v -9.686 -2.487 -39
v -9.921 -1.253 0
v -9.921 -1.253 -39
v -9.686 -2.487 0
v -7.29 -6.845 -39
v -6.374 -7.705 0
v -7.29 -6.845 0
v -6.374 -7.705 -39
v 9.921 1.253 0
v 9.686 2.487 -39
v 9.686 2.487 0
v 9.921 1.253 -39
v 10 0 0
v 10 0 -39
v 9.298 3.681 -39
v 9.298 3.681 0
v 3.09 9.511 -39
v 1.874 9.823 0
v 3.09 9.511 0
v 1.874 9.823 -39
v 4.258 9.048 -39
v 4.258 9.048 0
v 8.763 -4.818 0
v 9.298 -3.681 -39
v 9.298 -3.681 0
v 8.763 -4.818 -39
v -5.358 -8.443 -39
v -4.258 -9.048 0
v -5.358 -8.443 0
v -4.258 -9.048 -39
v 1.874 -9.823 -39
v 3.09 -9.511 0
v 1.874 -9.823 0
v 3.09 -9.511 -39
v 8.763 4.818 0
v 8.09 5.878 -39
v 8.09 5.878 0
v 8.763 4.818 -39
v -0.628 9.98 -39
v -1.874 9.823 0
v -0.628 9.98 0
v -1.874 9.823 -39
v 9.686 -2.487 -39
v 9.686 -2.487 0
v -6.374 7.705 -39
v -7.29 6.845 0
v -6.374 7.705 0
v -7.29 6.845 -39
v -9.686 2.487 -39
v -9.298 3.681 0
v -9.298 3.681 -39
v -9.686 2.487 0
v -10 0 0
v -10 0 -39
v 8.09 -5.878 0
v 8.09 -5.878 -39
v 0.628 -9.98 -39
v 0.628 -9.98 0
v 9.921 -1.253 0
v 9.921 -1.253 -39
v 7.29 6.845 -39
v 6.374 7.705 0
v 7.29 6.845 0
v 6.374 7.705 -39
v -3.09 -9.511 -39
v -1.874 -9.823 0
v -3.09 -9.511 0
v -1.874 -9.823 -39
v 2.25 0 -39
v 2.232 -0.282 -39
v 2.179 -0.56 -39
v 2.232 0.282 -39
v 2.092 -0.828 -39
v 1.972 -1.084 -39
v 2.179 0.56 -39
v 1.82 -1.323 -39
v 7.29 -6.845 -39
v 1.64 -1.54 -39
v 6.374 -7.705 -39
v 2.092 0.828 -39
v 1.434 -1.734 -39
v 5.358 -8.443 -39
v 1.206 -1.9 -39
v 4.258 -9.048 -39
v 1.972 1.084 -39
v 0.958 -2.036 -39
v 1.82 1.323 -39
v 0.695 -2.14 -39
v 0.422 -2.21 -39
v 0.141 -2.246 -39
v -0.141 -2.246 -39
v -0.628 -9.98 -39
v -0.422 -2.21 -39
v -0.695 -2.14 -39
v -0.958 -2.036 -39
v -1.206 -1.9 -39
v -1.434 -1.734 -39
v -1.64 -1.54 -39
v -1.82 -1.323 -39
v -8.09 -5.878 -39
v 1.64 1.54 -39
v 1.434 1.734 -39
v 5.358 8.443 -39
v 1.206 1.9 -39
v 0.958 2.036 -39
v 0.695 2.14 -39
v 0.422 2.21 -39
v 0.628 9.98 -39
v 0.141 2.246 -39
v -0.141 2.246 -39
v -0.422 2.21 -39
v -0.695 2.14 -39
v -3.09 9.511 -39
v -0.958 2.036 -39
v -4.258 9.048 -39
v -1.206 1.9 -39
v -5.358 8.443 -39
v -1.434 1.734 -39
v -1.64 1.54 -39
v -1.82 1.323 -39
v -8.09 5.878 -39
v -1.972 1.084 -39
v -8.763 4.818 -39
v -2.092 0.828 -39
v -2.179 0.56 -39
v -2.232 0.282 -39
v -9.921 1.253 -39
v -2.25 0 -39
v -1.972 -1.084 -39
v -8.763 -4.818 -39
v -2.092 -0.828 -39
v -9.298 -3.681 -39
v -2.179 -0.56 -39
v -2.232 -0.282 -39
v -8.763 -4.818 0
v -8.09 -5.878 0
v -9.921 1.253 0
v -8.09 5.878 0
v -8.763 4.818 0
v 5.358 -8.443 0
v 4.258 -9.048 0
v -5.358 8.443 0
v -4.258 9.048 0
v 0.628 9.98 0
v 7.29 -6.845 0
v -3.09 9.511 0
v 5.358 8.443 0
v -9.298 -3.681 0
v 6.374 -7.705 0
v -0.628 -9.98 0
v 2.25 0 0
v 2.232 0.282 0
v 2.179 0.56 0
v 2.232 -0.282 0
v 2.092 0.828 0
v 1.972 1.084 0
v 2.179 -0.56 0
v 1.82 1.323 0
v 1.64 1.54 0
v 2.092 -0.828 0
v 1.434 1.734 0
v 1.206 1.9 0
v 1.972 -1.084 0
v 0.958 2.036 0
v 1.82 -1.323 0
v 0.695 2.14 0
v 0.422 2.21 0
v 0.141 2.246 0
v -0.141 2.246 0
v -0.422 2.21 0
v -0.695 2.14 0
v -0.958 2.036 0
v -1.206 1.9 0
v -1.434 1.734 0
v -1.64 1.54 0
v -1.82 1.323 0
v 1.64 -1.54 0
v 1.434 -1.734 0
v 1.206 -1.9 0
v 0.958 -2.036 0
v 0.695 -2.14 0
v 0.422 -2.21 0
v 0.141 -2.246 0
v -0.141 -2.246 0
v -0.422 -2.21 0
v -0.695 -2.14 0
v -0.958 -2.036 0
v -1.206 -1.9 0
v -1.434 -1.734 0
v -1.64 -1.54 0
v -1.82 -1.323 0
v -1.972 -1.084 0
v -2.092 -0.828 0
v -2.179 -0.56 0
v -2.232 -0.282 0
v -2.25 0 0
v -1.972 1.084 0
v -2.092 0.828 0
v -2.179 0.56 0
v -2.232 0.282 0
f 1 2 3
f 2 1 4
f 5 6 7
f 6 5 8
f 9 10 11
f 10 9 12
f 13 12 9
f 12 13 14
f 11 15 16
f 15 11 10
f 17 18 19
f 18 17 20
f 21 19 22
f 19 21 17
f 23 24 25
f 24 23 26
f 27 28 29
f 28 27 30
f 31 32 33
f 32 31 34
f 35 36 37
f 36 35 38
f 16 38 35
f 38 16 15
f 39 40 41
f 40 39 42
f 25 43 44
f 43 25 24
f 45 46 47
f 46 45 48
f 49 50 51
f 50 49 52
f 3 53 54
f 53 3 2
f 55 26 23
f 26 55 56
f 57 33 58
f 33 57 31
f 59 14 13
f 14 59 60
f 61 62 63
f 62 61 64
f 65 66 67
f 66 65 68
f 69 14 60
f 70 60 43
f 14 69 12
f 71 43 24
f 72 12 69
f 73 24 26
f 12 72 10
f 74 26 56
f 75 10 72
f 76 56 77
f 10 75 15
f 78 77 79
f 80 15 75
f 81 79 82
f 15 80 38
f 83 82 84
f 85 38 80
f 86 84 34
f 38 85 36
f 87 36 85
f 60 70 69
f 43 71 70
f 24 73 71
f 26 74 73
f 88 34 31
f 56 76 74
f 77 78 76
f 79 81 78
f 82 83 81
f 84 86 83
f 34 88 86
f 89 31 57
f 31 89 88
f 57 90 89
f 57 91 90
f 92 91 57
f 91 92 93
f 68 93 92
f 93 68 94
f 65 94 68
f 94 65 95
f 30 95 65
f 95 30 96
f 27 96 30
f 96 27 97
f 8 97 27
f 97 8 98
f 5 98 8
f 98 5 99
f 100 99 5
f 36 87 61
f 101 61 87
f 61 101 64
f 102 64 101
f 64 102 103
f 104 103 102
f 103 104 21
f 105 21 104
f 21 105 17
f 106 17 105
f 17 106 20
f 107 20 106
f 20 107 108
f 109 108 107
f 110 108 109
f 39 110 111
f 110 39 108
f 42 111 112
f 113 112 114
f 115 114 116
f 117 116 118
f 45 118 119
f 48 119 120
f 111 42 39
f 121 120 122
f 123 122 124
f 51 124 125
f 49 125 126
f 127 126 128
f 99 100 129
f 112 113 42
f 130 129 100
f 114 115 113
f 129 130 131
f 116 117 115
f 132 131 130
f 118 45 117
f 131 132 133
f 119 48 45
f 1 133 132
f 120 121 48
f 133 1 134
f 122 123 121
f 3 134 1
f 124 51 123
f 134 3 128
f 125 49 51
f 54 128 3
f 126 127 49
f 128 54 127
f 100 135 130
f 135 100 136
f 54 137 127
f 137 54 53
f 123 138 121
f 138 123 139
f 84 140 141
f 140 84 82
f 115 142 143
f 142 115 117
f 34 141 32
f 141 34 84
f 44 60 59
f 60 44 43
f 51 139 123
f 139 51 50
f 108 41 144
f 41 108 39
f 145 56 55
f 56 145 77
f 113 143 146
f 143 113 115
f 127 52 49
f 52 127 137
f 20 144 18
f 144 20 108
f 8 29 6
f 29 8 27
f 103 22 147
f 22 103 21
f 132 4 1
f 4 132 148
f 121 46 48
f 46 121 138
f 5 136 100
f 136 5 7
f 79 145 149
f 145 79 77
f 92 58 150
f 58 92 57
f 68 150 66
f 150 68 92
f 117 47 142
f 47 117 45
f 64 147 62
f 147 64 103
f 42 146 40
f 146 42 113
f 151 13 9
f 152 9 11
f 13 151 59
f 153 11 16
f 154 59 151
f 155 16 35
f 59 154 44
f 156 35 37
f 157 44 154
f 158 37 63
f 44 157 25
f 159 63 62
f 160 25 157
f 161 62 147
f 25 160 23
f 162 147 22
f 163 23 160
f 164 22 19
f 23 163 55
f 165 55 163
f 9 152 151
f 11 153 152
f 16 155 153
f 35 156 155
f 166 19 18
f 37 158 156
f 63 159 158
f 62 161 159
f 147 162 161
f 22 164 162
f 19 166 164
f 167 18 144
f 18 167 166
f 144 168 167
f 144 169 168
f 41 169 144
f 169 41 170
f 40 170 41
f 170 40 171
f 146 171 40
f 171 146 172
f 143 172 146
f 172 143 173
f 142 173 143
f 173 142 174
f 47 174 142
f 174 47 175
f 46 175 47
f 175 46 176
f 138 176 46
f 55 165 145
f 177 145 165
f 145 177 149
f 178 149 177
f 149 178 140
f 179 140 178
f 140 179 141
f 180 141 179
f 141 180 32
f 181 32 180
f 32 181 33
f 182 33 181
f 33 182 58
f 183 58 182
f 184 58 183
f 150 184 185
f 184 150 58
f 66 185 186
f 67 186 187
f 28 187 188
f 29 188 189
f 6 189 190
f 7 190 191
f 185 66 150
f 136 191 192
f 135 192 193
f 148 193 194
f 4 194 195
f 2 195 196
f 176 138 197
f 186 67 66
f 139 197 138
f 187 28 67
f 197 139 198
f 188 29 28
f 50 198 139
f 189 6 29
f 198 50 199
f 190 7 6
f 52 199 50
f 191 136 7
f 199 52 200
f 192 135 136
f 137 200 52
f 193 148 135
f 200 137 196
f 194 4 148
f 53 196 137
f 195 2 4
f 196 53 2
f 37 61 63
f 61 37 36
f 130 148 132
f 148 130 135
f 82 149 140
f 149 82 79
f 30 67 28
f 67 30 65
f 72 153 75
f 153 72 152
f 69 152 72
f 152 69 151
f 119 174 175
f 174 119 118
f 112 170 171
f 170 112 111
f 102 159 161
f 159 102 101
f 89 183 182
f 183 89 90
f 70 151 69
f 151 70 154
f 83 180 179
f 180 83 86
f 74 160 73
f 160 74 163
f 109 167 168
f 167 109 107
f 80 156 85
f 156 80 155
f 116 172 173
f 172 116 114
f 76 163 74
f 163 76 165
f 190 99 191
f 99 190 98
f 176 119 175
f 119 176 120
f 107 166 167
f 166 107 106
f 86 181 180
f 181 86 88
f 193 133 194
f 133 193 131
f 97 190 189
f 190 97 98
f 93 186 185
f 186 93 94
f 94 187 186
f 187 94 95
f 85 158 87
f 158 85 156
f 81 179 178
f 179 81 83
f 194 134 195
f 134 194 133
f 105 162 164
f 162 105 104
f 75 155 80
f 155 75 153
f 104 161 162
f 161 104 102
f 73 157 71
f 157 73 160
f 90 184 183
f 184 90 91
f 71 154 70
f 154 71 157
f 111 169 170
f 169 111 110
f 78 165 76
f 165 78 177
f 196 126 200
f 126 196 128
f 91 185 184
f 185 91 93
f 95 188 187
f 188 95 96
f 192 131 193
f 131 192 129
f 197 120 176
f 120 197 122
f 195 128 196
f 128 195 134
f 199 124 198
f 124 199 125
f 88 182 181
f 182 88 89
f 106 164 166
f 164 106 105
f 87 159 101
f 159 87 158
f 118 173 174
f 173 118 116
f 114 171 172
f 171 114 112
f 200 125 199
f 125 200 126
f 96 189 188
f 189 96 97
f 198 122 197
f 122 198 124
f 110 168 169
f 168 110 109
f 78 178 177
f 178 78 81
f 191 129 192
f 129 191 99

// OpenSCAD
$fn = 50;


difference() {
	union() {
		translate(v = [0, 0, -39.0000000000]) {
			cylinder(h = 39, r = 10.0000000000);
		}
		cylinder(h = 0, r = 19.0000000000);
	}
	union() {
		#translate(v = [0, 0, -39]) {
			cylinder(h = 39, r = 2.2500000000);
		}
	}
}
